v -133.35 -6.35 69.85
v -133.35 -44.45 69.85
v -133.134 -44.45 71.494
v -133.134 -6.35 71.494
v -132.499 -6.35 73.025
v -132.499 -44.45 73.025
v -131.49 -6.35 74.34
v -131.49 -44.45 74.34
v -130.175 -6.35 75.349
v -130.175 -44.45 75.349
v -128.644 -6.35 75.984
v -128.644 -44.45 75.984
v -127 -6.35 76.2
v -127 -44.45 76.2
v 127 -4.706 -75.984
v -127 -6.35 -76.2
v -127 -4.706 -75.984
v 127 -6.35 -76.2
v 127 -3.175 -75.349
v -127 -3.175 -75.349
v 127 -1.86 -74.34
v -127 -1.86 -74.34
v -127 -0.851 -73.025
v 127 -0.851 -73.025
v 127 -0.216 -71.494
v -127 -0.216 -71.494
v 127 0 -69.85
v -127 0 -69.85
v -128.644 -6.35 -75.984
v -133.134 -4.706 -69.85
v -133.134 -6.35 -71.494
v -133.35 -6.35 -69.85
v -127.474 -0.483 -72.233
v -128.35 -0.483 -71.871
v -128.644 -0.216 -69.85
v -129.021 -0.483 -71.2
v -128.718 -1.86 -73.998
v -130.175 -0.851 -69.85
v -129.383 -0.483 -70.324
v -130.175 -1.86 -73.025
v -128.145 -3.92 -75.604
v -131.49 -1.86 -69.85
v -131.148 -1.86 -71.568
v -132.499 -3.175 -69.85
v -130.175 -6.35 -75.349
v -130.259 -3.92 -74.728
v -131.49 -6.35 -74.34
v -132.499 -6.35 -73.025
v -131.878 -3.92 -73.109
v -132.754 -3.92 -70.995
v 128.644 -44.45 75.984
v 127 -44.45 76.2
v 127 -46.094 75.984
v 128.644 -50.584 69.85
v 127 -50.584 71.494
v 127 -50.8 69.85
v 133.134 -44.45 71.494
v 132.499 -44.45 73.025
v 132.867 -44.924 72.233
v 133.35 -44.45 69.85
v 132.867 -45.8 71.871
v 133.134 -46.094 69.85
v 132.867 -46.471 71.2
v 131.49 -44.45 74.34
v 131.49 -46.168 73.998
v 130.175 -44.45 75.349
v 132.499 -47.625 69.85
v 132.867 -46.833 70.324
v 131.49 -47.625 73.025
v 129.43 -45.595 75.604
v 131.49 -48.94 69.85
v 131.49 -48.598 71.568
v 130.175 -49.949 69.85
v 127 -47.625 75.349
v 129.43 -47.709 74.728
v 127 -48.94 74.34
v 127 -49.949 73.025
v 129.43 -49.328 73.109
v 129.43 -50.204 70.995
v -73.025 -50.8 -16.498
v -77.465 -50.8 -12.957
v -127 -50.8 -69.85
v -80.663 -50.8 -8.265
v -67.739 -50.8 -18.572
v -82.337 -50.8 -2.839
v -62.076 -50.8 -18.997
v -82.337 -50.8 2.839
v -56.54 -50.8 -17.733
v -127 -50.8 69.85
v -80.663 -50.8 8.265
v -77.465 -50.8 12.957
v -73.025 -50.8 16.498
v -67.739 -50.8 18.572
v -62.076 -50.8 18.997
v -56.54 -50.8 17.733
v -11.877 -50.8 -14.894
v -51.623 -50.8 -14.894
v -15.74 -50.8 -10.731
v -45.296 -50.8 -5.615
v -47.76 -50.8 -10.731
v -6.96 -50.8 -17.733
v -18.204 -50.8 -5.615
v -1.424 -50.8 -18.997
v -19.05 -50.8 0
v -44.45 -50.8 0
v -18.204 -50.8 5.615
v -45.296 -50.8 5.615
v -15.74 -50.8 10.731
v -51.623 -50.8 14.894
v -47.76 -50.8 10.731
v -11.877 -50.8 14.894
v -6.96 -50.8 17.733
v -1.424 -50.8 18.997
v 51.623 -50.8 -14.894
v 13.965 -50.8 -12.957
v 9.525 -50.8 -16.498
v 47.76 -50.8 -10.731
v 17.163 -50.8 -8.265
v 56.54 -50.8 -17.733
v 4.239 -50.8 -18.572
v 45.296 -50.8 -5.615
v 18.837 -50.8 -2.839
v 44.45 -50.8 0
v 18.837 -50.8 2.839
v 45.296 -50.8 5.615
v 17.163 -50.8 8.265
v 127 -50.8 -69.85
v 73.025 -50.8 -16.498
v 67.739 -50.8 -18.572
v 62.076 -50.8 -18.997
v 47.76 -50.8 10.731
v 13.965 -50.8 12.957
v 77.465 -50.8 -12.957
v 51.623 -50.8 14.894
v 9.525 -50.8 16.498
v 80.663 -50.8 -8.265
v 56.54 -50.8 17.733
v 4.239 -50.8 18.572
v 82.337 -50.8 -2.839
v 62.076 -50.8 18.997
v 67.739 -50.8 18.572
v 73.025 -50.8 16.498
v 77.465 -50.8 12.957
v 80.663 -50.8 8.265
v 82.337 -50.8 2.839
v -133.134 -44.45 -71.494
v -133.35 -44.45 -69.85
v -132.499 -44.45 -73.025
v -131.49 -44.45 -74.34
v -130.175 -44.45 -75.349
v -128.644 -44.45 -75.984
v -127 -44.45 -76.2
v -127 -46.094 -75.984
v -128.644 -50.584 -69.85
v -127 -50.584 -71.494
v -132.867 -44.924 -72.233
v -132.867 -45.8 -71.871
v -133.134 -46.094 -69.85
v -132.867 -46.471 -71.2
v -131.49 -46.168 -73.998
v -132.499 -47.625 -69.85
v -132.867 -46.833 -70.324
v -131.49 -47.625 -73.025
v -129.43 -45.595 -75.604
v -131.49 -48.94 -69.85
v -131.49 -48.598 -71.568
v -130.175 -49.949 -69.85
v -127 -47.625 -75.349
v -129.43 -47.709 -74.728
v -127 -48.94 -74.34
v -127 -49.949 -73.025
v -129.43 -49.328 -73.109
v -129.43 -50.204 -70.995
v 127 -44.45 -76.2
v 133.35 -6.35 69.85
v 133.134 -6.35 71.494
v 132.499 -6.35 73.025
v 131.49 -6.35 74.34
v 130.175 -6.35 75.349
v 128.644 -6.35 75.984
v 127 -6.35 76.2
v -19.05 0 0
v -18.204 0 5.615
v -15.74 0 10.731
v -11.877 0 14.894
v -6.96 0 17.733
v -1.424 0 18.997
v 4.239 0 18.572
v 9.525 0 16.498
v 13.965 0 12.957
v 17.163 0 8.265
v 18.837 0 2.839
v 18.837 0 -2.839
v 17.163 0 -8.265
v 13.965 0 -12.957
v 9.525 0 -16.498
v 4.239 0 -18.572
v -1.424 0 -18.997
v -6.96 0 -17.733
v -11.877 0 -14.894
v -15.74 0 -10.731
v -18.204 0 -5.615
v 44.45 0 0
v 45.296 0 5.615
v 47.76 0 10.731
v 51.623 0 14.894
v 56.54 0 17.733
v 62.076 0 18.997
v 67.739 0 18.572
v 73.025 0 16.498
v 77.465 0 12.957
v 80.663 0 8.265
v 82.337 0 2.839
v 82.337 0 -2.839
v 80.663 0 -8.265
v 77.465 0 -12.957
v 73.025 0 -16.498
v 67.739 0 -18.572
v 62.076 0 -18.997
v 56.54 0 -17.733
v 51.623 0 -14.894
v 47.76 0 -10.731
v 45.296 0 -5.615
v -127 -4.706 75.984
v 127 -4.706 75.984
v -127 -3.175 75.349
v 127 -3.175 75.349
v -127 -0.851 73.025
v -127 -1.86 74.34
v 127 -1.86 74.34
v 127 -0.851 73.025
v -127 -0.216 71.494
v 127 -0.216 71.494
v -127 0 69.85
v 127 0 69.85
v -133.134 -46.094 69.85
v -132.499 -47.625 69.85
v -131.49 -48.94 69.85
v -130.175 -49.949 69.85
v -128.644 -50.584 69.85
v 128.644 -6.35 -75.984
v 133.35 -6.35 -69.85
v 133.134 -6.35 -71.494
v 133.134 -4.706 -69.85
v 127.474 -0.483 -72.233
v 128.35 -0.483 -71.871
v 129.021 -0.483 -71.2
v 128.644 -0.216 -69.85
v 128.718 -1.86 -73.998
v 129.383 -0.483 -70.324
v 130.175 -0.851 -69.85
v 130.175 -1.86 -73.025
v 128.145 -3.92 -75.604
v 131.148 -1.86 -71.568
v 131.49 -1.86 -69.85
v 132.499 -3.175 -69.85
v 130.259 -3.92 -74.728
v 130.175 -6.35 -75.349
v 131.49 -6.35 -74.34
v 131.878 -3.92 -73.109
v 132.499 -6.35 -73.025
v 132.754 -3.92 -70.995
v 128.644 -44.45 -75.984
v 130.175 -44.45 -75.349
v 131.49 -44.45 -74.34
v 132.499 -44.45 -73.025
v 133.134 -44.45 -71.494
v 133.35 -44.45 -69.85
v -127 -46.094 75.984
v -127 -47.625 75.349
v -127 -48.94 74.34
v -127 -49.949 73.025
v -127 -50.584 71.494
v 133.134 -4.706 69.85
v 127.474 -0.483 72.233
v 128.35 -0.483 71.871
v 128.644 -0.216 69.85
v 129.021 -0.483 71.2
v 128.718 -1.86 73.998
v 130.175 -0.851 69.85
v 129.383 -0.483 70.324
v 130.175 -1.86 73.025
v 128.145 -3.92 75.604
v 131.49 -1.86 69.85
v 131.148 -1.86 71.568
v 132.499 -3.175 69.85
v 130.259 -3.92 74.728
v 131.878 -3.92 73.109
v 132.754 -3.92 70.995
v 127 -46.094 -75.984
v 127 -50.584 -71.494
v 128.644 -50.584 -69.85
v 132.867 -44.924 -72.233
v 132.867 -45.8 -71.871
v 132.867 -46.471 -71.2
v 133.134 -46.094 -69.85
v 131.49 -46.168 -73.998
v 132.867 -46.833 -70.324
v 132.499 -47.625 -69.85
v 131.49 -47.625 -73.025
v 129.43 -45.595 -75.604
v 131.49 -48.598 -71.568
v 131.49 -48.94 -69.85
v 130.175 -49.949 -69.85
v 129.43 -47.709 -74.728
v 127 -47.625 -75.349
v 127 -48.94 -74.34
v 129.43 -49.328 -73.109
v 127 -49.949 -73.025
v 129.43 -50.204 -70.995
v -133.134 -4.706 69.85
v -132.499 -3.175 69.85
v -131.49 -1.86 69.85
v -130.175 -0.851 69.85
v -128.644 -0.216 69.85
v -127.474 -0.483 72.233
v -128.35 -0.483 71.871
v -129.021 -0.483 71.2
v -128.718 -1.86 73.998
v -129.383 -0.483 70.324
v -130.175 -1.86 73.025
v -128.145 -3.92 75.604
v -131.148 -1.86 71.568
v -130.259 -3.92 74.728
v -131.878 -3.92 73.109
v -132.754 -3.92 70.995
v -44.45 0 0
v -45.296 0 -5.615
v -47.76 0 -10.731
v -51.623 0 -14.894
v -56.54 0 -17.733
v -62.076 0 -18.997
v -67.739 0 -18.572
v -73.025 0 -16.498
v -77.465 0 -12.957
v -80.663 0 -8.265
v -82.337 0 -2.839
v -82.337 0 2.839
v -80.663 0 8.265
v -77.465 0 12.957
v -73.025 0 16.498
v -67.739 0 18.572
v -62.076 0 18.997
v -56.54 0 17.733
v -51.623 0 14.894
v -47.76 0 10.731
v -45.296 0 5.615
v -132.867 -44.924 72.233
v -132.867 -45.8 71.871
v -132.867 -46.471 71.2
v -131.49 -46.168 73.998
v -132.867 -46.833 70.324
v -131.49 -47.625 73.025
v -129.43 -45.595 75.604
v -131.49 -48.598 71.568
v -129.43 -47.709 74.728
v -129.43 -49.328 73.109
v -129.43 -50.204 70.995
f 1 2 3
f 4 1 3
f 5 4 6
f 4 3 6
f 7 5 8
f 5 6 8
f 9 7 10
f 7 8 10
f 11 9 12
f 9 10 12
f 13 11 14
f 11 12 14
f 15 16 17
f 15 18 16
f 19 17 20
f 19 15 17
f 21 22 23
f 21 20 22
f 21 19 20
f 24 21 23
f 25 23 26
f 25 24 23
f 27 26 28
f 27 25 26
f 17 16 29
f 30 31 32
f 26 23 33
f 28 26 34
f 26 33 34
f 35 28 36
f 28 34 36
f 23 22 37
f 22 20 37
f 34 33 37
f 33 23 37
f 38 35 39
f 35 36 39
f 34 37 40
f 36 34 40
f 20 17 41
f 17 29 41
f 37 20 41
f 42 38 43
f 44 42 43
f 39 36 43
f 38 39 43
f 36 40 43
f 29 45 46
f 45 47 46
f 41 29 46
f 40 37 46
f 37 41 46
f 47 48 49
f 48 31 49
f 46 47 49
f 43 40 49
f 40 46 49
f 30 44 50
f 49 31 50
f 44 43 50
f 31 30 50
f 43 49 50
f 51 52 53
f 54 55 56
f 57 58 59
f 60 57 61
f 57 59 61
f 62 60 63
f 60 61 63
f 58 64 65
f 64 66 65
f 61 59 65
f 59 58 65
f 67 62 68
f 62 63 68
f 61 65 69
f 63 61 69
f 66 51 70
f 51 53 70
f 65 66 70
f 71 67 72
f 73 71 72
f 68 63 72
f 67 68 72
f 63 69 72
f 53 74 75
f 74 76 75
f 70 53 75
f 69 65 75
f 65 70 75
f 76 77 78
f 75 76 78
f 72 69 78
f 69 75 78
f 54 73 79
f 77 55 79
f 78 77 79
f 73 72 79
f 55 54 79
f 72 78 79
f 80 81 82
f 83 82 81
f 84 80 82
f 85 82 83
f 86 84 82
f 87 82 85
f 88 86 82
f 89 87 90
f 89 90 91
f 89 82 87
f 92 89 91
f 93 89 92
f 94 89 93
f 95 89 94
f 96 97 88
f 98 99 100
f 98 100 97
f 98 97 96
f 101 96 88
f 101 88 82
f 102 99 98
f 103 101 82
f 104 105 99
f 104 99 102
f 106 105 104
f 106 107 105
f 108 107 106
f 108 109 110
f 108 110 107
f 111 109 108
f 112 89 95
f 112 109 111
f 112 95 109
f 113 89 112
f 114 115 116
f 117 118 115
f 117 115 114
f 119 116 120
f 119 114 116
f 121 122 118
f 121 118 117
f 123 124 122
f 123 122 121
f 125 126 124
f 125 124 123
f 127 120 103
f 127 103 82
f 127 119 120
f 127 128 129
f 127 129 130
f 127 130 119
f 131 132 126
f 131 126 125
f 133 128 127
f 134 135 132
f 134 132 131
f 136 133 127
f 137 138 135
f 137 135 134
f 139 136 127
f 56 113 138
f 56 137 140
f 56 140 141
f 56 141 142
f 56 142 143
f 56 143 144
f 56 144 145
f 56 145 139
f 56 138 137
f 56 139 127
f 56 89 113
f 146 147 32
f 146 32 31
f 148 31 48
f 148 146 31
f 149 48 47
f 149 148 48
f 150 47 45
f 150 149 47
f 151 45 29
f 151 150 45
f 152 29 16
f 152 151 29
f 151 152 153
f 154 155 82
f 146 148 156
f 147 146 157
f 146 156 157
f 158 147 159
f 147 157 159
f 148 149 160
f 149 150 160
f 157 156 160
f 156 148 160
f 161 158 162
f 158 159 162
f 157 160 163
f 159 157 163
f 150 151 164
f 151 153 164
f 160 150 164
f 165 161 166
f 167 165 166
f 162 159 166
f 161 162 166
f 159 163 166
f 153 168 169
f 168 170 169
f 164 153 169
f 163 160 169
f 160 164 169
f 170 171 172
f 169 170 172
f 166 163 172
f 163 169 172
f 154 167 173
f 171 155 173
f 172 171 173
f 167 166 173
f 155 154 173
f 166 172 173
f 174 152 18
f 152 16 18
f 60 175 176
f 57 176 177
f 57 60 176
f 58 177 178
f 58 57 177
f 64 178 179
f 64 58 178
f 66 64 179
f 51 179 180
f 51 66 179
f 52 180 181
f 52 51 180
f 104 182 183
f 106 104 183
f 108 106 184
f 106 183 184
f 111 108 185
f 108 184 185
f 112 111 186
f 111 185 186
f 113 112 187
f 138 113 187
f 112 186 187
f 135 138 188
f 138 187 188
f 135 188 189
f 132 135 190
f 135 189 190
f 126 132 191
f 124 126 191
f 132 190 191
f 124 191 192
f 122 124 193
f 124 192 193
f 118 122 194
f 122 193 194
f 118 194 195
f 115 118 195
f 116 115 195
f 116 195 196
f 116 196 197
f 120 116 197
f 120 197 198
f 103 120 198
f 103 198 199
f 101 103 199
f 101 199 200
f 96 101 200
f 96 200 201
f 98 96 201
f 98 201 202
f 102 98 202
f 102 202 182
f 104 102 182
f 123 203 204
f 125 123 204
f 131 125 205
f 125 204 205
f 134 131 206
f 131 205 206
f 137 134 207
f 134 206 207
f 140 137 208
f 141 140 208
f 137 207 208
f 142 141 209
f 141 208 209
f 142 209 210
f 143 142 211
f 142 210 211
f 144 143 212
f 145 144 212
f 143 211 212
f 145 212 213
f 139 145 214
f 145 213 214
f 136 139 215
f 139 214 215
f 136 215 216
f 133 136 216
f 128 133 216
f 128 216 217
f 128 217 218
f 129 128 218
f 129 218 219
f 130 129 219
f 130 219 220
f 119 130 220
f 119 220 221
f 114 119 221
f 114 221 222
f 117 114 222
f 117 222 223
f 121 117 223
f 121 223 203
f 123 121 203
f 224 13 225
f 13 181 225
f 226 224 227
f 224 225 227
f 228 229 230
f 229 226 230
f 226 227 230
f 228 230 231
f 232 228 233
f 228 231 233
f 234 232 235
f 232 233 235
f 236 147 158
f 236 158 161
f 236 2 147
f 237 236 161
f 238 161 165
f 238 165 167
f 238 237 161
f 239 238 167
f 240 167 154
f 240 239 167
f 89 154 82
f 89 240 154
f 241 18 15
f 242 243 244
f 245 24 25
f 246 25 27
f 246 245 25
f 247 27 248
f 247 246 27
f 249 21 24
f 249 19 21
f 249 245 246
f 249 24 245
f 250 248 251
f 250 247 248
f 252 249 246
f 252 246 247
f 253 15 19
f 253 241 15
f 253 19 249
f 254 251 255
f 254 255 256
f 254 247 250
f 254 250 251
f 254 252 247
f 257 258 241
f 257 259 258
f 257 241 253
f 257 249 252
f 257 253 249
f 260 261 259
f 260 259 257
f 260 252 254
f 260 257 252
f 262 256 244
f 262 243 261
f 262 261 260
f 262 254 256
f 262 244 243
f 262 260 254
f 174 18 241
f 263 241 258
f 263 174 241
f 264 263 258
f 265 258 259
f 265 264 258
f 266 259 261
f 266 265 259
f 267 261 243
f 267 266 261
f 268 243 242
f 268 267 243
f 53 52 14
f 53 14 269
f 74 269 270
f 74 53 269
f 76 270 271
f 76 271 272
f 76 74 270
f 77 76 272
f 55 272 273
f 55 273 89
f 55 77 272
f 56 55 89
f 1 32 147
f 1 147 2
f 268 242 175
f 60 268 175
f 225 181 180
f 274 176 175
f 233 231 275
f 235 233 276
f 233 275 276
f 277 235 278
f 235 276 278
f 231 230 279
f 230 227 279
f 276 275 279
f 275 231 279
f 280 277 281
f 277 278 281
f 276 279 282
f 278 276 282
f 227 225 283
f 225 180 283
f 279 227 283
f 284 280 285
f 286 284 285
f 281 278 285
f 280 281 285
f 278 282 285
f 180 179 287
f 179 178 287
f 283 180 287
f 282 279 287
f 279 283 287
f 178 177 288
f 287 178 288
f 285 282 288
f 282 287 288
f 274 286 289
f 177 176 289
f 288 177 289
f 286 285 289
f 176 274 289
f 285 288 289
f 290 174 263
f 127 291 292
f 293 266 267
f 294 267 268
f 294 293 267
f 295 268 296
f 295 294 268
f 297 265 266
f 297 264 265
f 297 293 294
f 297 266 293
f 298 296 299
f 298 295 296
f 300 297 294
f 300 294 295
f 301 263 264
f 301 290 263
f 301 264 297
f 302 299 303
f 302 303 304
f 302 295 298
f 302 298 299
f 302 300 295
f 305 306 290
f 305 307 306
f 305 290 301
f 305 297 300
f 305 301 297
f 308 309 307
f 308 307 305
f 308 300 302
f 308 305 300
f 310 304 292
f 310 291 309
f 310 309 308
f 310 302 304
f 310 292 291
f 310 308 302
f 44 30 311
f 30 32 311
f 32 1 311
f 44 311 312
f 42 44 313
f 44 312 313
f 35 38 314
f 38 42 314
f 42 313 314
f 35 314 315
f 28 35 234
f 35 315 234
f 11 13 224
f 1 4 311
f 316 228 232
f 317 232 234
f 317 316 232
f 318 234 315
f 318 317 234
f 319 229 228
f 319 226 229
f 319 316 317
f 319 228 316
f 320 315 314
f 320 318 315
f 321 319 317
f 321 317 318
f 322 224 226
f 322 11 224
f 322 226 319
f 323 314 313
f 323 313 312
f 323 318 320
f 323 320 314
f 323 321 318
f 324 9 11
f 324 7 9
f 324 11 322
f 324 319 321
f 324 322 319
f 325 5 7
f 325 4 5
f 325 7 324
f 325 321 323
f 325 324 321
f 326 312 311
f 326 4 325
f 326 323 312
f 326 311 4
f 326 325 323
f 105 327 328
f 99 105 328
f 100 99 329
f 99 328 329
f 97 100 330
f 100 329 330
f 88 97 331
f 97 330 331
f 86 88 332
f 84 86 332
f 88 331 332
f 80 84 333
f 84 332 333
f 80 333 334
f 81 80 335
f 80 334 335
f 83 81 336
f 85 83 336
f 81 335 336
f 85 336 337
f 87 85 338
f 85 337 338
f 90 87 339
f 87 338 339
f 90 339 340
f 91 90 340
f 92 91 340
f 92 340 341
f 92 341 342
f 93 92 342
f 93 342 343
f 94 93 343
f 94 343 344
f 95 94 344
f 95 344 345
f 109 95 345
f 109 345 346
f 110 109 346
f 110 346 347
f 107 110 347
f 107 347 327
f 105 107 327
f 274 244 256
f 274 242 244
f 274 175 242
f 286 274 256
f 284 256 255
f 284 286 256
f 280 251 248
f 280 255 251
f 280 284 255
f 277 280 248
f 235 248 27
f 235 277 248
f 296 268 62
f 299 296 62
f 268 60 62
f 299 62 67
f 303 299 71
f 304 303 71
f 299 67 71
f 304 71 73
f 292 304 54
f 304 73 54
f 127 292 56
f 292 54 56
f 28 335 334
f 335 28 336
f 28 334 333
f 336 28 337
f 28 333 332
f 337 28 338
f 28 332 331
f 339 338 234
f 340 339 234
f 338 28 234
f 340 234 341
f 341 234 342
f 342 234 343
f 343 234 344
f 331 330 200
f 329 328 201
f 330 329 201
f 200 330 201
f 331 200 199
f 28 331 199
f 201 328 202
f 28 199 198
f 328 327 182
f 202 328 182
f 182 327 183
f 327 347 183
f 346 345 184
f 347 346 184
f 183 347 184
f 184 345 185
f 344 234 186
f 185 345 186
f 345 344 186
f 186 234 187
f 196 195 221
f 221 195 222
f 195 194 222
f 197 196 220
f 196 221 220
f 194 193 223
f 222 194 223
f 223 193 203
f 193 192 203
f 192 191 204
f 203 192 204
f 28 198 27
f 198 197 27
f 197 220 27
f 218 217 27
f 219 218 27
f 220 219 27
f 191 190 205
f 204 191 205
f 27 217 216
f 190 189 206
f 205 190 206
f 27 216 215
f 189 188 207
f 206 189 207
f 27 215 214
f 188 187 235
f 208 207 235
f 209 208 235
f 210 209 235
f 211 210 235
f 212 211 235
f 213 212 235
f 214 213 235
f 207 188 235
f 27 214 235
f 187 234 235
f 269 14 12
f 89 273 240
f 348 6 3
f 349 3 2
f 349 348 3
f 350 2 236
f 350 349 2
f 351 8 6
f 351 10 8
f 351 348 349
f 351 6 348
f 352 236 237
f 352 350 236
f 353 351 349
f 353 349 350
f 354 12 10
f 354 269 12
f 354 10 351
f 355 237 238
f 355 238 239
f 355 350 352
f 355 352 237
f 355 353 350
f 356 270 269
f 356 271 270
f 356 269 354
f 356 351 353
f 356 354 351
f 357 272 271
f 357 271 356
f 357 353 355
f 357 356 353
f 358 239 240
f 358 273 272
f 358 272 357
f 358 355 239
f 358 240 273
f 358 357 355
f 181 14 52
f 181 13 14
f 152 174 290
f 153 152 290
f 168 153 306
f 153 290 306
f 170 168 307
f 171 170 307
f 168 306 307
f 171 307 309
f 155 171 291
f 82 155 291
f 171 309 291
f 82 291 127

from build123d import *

# Parameters (mm, degrees)
F0_W     = 266.7
F0_H     = 152.4
F1_DEPTH = 50.8
F2_R     = 6.35
F3_R     = 19.05
F4_DEPTH = 63.5


with BuildPart() as f1:
    # F0 (on Front) → F1 (new body)
    with BuildSketch(Plane.XZ):
        Rectangle(F0_W, F0_H)
    extrude(amount=F1_DEPTH)

    # F2
    f2_edges = [f1.edges().sort_by_distance(p)[0] for p in [
        (0, -50.8, 76.2),
        (133.35, -25.4, 76.2),
        (-133.35, -25.4, 76.2),
        (0, 0, 76.2),
        (0, -50.8, -76.2),
        (-133.35, -25.4, -76.2),
        (133.35, -25.4, -76.2),
        (0, 0, -76.2),
        (-133.35, -50.8, 0),
        (-133.35, 0, 0),
        (133.35, -50.8, 0),
        (133.35, 0, 0),
    ]]
    fillet(f2_edges, radius=F2_R)

    # F3 (on face) → F4 (cut)
    with BuildSketch(Plane(origin=(0, 0, 0), x_dir=(-1, 0, 0), z_dir=(0, 1, 0))):
        with Locations((-63.5, 0)):
            Circle(F3_R)
        with BuildLine():
            ThreePointArc((-19.05, 0), (0, -19.05), (19.05, 0))
            Line((19.05, 0), (0, 0))
            Line((0, 0), (-19.05, 0))
        make_face()
        with BuildLine():
            Line((0, 0), (19.05, 0))
            ThreePointArc((19.05, 0), (0, 19.05), (-19.05, 0))
            Line((-19.05, 0), (0, 0))
        make_face()
        with BuildLine():
            ThreePointArc((82.55, 0), (63.5, 19.05), (44.45, 0))
            ThreePointArc((44.45, 0), (63.5, -19.05), (82.55, 0))
        make_face()
    extrude(amount=-F4_DEPTH, mode=Mode.SUBTRACT)


solid = f1.part
